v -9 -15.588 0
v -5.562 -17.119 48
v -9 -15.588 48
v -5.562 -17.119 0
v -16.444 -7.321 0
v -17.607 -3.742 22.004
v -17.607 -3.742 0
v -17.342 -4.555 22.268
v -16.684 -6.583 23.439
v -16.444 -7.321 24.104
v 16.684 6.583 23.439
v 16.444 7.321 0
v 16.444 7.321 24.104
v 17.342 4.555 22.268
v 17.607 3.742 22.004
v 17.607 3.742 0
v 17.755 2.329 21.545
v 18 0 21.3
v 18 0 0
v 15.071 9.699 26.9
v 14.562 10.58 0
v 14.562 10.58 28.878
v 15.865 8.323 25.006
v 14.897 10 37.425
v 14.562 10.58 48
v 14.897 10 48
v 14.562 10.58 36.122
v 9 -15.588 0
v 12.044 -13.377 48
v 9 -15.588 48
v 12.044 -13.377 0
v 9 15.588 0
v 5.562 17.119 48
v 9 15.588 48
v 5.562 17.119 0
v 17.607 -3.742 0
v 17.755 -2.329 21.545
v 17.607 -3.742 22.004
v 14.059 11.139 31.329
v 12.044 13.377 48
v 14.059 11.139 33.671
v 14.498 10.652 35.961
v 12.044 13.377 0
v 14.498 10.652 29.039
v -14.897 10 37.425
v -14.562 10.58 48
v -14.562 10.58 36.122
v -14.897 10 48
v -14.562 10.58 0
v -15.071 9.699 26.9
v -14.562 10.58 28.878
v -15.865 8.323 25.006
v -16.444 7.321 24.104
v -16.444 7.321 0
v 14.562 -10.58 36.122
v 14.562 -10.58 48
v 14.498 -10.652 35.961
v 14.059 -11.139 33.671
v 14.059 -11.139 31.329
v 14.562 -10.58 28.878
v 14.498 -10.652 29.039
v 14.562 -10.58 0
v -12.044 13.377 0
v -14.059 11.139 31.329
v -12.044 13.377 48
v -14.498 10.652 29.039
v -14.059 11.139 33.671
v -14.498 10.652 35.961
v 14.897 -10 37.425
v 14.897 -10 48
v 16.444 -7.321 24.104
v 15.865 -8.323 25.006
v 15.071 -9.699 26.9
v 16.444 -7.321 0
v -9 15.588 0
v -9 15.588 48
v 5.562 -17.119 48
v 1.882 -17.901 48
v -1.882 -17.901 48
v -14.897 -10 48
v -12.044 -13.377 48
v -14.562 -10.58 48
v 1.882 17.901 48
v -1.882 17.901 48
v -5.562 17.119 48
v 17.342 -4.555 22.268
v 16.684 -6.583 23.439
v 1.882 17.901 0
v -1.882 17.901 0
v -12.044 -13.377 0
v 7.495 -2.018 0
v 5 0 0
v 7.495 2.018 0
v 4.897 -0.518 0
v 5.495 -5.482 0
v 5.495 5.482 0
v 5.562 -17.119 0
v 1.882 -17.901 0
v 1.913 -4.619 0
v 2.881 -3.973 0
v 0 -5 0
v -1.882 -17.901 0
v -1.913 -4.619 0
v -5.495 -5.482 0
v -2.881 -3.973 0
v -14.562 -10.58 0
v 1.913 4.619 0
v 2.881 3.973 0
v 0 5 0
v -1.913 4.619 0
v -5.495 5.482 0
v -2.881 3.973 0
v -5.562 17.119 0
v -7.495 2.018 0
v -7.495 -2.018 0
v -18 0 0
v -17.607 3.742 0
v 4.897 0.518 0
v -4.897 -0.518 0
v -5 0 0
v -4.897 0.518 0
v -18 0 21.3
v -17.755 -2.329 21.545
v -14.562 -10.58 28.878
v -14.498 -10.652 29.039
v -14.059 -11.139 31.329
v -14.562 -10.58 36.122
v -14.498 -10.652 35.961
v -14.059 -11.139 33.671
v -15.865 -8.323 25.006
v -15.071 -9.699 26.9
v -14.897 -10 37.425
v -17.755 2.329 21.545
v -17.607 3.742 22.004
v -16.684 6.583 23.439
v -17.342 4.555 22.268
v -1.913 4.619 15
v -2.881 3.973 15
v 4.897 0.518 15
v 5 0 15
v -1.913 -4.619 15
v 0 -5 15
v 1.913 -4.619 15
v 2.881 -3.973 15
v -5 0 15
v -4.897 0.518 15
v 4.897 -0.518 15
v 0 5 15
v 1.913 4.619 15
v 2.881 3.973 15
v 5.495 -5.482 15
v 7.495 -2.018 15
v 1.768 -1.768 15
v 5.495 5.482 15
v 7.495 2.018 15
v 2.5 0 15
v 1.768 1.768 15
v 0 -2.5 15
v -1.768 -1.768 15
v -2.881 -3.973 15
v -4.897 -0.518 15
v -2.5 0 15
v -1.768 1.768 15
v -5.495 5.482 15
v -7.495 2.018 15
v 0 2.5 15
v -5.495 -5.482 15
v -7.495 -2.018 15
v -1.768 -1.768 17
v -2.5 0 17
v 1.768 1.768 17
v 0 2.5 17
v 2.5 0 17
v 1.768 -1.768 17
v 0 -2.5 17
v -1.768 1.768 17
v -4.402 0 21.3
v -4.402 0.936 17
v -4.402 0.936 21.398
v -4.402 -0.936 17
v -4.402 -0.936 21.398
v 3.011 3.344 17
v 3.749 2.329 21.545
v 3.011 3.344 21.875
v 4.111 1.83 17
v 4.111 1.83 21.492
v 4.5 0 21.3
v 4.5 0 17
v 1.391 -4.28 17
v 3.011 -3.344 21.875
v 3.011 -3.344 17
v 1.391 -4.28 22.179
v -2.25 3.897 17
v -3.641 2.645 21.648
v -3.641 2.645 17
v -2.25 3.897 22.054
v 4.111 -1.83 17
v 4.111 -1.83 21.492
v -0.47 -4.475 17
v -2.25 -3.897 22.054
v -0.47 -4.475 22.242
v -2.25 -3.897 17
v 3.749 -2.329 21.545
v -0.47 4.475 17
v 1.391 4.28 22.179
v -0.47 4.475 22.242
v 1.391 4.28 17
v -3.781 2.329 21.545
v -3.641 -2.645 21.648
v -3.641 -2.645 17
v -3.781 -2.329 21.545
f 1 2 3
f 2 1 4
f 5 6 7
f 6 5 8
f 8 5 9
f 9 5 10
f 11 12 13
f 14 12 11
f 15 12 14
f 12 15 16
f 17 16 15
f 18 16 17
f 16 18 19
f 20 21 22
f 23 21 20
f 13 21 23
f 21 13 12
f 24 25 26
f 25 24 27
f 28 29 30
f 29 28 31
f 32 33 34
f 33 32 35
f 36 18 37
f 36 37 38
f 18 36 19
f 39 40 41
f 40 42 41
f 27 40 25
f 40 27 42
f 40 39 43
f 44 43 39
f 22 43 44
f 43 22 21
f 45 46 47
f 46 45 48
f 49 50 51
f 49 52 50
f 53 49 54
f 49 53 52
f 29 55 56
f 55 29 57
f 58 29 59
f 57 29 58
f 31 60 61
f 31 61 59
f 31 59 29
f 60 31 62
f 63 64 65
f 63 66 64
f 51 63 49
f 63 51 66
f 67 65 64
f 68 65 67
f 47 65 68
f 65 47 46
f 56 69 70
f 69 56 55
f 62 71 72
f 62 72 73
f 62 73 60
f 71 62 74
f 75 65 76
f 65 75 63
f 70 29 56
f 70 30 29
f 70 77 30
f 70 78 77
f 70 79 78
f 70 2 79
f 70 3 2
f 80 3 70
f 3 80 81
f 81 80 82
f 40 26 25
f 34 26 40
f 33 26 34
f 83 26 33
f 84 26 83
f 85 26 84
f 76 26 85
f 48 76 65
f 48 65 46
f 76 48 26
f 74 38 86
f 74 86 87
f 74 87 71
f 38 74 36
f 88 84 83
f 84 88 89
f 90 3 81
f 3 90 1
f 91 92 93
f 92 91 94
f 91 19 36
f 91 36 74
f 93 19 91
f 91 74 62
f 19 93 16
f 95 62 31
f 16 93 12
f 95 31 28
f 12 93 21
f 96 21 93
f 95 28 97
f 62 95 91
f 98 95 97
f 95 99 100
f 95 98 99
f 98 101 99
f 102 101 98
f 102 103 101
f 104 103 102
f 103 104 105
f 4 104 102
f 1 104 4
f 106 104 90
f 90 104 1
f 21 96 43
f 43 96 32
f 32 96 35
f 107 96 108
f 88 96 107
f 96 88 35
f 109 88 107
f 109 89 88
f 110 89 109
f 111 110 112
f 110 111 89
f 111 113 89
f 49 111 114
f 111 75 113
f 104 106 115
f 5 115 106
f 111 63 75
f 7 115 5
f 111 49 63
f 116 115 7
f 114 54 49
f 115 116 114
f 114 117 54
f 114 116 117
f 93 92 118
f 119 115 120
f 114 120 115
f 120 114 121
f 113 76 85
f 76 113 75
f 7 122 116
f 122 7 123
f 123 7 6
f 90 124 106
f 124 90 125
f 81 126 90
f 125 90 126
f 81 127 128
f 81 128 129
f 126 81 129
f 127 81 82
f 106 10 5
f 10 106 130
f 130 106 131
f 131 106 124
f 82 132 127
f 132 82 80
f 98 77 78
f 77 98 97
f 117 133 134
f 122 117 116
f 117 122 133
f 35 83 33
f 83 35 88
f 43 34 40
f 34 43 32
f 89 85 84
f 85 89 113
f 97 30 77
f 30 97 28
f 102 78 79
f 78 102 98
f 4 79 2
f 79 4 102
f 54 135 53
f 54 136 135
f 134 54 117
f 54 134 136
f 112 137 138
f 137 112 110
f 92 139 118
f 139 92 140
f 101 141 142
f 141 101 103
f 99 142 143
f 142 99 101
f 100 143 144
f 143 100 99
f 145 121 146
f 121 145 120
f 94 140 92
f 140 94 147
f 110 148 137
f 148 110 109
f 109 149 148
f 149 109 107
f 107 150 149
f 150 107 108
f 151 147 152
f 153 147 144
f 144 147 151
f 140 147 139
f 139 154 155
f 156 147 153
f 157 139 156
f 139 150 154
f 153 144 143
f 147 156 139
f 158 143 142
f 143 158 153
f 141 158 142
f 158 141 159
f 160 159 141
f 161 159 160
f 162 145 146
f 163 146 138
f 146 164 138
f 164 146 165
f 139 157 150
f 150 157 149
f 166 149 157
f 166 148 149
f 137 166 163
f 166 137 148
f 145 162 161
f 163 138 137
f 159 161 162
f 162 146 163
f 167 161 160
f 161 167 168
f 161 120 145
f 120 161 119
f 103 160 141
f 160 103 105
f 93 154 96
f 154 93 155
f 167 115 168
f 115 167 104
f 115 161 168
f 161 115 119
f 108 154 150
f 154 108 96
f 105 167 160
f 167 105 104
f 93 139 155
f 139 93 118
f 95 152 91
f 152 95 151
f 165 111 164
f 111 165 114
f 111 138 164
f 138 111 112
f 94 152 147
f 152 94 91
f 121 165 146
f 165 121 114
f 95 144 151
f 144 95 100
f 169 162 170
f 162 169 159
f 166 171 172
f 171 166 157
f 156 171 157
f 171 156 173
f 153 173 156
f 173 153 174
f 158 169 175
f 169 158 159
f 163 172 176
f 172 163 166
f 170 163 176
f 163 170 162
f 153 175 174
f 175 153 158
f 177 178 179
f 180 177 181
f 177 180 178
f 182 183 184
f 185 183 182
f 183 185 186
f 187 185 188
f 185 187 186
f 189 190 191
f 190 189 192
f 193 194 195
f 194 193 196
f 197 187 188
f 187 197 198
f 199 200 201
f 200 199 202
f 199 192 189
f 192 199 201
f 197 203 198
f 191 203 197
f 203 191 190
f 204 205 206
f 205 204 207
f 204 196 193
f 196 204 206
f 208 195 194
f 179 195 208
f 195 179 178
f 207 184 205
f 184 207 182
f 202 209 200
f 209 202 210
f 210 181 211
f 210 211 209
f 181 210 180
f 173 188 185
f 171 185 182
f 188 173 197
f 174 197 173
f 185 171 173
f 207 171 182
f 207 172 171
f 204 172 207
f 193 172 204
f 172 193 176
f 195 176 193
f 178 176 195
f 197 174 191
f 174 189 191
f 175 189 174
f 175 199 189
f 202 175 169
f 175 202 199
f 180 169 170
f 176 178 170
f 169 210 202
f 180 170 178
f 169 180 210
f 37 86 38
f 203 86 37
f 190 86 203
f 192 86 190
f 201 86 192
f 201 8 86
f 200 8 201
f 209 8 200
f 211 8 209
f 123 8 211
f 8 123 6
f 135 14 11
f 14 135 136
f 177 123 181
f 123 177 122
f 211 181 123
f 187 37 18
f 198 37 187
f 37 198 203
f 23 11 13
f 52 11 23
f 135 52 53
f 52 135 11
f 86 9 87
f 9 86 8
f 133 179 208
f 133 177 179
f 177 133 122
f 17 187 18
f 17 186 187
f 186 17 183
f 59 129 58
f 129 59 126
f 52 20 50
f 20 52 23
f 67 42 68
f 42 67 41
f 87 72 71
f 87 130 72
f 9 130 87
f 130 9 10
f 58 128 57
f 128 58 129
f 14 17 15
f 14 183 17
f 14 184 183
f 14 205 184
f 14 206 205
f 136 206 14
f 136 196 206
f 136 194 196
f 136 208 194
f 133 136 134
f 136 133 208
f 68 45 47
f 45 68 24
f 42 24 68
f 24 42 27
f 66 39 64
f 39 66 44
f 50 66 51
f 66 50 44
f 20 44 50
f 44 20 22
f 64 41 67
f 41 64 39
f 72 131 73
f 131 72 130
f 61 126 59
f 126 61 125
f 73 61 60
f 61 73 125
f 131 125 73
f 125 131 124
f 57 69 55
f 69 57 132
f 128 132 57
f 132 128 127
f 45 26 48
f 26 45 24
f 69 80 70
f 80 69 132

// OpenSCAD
// height of the inner hole for the screw
innerheight= 16;

difference(){

 //main cylinder
 cylinder(h=48,r=18);


 //subtract inner cylinder, add 1mm below
 translate([0,0,-1]){
  cylinder(h=innerheight,r=5);
 }
 
 //add the two blocks
 rotate([0,0,30]){
   translate([-7.5,-2,-1]){ 
    cube([15,4,innerheight]);
  }  
 }
 rotate([0,0,-30]){
   translate([-7.5,-2,-1]){ 
    cube([15,4,innerheight]);
  }  
 }

 //5mm screw hole
 translate([0,0,-1]){
  cylinder(h=40,r=2.5);
 }


 //screw head
 translate([0,0,17]){
   cylinder(h=50,r=4.5);
 }


 //cylinder hole for the shower head
 translate([-25,0,32.5]){
  rotate([0,90,0]){
   cylinder(h=50,r=11.2);
  }
 }

 //top cube where the tube can be slided in
 translate([-20,-10,32.5]){
   cube([40,20,20]);
 }

}
